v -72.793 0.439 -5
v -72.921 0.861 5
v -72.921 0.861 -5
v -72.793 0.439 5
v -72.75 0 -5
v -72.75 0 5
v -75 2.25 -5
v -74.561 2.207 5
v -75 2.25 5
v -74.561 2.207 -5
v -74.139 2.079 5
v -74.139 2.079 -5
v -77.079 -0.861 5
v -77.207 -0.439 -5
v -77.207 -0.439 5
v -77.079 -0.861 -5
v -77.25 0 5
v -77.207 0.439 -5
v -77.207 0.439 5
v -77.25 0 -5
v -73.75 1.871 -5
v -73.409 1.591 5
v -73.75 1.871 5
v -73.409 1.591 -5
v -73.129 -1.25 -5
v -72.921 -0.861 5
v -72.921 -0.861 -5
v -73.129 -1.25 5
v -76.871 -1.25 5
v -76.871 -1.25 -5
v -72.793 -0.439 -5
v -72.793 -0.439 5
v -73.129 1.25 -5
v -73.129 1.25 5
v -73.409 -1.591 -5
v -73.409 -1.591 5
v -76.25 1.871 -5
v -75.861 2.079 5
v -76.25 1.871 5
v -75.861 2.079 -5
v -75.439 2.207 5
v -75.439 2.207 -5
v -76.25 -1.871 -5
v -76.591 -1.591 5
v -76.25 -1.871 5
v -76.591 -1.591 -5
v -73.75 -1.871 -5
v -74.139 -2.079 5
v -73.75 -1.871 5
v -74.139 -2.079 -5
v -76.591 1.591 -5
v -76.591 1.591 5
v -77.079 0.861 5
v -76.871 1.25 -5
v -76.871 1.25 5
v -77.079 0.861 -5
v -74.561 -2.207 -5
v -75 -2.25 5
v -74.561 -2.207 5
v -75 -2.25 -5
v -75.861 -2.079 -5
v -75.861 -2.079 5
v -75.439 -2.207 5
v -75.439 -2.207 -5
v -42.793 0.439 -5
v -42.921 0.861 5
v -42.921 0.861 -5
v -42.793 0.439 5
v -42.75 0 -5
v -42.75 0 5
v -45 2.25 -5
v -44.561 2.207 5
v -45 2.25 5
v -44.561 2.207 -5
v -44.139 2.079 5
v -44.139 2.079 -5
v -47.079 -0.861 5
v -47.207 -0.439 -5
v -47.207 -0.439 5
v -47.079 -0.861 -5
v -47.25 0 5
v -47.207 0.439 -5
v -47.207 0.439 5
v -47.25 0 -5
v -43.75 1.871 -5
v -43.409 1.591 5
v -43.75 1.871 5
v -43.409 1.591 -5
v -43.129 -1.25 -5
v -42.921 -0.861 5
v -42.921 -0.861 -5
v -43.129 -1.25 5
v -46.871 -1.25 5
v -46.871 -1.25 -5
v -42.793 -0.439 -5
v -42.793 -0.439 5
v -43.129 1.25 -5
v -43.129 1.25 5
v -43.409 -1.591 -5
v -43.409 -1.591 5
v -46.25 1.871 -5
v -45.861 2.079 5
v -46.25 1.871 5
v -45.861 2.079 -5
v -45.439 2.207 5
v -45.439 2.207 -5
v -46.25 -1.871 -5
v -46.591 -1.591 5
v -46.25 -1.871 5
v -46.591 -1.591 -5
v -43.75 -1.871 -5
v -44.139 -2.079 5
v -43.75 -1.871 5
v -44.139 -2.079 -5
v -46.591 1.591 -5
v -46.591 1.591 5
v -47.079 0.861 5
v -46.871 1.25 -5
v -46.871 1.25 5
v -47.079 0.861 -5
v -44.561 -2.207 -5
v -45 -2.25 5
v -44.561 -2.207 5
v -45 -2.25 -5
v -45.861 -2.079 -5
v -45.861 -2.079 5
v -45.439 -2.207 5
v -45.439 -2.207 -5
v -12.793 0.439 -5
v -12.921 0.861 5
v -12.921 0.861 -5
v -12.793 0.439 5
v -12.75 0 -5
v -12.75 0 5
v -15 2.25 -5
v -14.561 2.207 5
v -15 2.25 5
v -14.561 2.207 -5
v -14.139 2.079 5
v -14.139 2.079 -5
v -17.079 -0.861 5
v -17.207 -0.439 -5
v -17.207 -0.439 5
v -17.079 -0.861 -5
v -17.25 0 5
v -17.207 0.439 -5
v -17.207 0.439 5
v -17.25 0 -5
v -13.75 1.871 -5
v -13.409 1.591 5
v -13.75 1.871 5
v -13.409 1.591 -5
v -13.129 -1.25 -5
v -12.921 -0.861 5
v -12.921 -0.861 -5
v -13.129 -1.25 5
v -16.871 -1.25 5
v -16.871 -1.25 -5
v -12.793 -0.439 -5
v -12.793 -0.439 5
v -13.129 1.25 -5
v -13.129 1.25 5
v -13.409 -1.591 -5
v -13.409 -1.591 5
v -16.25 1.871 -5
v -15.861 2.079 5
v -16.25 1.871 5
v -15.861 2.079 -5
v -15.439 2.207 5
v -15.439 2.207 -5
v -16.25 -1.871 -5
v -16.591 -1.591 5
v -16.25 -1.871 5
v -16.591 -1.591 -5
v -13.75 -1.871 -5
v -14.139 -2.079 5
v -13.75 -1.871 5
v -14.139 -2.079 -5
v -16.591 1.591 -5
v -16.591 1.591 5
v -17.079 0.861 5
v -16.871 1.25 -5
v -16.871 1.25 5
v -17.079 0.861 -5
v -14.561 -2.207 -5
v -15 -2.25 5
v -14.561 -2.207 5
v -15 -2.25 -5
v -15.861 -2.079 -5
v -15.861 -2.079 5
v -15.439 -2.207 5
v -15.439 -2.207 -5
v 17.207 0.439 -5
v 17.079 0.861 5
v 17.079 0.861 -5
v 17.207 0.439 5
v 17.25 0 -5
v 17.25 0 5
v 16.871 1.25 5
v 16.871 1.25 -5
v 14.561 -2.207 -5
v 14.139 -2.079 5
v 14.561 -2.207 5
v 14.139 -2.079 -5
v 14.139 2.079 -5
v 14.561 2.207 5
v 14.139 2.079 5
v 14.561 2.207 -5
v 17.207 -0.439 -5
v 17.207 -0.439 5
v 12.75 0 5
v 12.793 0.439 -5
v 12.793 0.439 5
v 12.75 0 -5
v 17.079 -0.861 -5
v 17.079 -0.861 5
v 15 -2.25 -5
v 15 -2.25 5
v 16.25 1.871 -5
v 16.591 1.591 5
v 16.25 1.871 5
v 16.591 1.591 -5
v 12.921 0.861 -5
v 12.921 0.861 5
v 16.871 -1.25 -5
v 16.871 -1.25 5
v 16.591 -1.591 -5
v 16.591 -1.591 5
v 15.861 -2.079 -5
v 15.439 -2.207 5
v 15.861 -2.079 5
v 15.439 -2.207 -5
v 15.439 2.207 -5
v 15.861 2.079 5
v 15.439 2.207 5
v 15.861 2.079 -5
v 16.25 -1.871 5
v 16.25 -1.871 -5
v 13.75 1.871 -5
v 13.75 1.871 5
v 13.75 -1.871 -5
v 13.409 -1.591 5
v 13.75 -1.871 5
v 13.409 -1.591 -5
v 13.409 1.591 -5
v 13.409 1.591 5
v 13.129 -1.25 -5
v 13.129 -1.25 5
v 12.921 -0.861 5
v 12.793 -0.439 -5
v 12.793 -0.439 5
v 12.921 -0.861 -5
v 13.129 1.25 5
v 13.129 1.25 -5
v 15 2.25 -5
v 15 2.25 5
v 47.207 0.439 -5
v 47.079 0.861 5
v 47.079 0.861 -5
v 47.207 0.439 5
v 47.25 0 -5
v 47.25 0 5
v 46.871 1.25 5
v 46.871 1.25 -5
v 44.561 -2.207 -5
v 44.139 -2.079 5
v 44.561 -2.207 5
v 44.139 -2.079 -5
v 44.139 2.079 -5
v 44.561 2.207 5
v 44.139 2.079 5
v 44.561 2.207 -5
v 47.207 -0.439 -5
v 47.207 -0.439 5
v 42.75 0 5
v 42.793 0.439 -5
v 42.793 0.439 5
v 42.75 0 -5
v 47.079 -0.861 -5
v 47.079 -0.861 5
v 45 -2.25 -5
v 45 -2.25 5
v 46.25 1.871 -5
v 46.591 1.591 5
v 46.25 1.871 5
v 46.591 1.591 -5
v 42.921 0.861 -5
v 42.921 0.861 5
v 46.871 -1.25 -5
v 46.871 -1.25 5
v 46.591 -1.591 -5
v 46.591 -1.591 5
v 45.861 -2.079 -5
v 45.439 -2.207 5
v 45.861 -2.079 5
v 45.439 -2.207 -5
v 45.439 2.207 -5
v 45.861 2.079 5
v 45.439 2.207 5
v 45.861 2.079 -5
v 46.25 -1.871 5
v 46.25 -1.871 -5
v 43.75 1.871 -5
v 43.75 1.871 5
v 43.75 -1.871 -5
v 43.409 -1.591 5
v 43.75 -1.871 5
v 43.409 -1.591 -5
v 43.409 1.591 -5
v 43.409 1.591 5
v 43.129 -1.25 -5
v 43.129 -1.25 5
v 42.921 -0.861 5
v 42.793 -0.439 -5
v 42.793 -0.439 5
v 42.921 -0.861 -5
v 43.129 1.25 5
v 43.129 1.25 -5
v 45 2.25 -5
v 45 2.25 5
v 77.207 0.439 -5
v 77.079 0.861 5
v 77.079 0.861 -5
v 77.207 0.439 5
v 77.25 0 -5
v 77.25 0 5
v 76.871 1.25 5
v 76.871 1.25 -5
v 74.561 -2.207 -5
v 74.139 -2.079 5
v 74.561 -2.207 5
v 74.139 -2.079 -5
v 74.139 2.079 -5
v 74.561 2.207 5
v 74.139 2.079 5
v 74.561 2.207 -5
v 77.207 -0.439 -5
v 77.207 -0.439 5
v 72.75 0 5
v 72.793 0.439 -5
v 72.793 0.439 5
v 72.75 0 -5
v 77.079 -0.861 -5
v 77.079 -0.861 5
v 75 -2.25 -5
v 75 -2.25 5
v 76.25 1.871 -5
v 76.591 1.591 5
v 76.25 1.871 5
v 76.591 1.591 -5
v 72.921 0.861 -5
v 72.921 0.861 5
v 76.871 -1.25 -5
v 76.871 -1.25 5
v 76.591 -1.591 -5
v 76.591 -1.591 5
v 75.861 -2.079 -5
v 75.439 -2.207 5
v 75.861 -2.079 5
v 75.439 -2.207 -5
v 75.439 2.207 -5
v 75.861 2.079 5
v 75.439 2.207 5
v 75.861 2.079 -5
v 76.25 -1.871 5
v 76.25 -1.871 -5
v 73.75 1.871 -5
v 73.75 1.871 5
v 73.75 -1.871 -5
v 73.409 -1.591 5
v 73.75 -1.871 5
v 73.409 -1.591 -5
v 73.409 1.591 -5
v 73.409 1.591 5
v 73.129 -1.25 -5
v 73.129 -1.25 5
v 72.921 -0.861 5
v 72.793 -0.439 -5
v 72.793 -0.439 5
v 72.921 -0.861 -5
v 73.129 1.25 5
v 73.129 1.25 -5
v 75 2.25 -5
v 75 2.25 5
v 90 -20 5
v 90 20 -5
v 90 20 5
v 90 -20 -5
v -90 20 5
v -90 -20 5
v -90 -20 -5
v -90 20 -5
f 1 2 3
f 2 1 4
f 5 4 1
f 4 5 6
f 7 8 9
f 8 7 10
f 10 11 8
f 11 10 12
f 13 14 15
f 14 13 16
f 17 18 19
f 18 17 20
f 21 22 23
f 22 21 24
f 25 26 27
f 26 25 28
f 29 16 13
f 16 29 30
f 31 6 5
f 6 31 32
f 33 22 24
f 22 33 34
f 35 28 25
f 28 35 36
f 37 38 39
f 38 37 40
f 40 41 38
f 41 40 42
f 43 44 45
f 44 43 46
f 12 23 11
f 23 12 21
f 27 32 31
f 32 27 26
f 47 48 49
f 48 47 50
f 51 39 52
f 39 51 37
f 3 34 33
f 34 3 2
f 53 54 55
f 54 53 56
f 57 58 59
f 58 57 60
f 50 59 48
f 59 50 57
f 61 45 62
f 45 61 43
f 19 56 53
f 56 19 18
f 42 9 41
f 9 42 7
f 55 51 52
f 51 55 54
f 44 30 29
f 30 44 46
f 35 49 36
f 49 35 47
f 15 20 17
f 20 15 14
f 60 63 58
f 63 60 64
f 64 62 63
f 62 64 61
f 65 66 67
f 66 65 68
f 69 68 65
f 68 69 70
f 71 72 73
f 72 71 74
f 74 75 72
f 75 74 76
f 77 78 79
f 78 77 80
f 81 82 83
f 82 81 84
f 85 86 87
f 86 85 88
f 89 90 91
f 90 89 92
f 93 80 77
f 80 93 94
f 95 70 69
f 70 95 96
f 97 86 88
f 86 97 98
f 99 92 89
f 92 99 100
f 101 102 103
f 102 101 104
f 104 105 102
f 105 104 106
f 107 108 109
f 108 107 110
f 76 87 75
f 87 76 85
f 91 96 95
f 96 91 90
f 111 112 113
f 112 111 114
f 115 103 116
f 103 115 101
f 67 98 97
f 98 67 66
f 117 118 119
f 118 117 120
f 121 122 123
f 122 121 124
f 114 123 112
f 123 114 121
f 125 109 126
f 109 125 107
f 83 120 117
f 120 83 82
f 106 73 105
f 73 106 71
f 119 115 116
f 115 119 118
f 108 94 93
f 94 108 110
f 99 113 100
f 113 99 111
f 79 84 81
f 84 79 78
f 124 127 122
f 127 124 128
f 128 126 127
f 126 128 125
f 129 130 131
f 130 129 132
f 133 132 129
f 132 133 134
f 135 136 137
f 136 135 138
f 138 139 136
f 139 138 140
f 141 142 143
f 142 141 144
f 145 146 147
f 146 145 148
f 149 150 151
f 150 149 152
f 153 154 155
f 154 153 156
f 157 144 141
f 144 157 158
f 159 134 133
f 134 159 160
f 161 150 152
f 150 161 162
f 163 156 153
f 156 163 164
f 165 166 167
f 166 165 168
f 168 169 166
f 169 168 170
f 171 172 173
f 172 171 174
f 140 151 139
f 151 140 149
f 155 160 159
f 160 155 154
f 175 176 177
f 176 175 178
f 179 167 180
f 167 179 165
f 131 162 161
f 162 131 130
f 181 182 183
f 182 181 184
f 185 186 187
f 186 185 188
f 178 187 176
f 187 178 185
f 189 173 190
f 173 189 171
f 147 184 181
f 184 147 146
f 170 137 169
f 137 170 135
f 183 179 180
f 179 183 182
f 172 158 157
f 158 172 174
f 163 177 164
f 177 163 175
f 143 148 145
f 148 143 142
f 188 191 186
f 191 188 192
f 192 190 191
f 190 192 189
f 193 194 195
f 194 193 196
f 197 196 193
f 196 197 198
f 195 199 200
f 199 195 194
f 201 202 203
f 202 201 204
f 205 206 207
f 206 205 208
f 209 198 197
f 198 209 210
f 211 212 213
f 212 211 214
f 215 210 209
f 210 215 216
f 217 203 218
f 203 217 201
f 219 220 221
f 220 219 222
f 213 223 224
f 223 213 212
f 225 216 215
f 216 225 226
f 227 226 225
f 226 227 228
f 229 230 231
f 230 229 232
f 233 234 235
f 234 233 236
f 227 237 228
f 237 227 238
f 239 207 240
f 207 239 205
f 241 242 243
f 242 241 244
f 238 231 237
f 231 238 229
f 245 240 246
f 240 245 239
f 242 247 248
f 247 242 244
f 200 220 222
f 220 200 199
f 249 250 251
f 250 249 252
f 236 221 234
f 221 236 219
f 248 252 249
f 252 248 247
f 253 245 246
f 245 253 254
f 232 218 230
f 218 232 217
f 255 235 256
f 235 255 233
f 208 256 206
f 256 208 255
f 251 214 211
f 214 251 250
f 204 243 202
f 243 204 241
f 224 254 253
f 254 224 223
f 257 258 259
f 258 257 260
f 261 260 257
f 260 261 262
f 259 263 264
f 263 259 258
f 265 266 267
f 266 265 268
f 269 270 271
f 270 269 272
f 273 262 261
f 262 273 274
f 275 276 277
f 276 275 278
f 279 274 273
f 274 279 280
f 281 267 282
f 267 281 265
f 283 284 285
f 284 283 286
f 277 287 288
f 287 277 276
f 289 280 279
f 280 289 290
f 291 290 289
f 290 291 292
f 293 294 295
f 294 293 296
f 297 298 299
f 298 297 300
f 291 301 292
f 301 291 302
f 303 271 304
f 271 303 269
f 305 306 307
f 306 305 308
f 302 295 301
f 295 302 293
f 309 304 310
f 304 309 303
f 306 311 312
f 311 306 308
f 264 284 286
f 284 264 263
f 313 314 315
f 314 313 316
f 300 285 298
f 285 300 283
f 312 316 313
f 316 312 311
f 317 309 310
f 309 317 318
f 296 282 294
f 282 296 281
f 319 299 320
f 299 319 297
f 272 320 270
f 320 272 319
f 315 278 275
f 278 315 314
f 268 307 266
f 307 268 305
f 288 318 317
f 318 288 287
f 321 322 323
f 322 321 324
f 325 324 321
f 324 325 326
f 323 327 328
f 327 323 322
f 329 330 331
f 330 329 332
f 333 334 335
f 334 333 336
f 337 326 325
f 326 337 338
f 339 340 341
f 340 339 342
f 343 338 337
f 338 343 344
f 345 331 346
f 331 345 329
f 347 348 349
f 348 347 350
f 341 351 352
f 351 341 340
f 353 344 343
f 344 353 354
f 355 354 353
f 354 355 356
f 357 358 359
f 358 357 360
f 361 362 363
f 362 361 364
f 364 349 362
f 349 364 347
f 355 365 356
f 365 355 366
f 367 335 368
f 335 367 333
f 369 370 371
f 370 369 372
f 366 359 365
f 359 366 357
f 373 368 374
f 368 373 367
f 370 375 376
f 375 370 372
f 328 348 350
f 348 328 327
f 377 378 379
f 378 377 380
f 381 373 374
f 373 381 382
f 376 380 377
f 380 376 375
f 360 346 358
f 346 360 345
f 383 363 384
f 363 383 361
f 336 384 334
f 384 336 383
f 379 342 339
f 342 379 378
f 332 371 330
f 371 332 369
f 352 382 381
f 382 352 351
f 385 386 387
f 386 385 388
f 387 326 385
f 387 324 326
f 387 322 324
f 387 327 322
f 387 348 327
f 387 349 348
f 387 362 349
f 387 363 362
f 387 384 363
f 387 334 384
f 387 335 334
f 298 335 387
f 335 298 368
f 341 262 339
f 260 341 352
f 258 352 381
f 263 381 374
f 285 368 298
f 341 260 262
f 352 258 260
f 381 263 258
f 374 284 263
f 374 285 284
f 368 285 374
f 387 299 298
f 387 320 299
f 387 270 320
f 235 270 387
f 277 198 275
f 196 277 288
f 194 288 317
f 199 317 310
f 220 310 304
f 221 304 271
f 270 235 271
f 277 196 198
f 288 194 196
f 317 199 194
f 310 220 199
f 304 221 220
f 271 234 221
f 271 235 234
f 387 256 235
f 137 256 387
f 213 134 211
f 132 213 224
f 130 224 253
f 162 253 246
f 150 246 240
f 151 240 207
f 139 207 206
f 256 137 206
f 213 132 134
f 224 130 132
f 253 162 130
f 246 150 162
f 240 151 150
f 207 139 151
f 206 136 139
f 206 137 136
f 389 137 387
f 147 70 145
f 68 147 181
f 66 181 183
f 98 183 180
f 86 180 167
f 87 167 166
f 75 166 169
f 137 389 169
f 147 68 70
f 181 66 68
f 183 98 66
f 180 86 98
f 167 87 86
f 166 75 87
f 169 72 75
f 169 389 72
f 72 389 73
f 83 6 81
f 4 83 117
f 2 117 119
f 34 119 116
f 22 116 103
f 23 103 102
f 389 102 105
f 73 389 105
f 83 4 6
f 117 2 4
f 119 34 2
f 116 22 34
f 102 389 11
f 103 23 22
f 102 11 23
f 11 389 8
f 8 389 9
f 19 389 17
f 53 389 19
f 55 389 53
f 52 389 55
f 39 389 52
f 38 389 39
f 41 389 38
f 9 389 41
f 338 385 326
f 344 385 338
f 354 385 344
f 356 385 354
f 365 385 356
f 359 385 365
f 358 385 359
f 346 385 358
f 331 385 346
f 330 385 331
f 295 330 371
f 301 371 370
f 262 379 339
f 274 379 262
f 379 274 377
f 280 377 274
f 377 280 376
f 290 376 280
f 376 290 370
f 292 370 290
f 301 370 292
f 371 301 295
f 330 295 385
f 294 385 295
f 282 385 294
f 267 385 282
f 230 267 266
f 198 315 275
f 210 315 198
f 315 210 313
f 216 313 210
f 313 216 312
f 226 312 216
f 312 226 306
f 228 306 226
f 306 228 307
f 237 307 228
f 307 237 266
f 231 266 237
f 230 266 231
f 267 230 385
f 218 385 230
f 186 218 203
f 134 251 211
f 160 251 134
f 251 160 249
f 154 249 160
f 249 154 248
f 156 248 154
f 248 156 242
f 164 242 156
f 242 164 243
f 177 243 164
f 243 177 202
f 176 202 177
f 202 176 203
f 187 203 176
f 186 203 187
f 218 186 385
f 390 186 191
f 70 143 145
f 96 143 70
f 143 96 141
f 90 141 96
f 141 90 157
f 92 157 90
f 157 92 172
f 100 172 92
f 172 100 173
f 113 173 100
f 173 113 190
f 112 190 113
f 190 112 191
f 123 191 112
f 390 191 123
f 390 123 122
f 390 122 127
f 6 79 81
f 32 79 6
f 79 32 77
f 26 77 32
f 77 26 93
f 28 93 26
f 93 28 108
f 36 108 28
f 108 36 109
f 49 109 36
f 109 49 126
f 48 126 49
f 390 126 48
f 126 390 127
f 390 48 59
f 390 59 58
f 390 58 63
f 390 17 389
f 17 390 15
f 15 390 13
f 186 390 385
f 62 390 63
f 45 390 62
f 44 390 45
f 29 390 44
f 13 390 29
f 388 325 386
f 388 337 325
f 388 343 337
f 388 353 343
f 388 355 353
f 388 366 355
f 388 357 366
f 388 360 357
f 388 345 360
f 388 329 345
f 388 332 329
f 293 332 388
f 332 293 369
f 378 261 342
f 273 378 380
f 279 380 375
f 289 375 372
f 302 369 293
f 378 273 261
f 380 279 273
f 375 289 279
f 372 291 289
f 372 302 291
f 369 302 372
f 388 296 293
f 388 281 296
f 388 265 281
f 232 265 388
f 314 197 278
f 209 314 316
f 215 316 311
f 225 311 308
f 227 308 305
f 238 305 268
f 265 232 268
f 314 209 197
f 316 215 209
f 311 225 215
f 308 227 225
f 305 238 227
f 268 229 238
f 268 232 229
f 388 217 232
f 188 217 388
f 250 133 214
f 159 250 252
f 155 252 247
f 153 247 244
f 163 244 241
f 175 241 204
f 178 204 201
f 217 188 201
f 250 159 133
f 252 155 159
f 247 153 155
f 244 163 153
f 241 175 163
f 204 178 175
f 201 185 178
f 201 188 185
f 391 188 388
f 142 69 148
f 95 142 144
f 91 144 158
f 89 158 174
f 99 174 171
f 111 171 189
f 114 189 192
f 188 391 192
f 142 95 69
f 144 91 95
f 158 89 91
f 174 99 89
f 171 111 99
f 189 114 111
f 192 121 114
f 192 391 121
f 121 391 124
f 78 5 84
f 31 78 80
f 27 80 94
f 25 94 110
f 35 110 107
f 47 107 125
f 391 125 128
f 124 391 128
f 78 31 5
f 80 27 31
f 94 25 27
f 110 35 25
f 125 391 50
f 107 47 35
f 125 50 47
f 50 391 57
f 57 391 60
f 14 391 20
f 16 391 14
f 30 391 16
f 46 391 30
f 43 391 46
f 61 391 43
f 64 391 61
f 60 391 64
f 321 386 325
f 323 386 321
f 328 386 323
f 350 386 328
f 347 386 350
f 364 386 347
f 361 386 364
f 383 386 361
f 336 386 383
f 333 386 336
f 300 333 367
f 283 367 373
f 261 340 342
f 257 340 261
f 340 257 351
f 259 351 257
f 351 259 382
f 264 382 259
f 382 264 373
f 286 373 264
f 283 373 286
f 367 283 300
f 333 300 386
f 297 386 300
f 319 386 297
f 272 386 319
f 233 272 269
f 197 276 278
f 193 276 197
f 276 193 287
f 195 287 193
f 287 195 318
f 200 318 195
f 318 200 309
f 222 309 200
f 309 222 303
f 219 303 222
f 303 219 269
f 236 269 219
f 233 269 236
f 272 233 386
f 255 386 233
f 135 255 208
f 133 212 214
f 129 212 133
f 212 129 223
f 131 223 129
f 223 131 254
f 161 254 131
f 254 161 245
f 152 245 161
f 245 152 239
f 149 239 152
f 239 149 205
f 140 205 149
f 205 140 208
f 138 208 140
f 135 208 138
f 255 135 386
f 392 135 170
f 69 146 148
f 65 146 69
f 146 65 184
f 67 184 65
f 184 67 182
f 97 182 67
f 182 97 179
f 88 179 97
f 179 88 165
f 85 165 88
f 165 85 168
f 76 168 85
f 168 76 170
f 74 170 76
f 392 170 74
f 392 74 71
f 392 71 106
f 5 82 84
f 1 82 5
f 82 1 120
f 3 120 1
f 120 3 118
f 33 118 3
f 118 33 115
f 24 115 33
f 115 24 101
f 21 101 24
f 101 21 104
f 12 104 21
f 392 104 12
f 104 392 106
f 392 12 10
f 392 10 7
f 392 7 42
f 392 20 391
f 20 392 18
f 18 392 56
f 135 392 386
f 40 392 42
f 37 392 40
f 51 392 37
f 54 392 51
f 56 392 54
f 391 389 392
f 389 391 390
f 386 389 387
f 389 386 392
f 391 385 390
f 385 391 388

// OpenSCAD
$fn = 32;

// ----------------------------------------------------------------------
// Hole bar, 6 x Ø4.5
// row layout, 15 mm edge offset
// ----------------------------------------------------------------------

// --- parameters (mm) ---
bar_w = 40;    // bar width (Y)
bar_t = 10;    // bar thickness (Z)
holes = 6;     // holes per row
hole_d = 4.5;  // hole diameter
edge = 15;     // offset from the bar end to the first hole
pitch = 30;    // pitch between neighbouring holes

// --- derived feature positions (mm) ---
span = (holes - 1) * pitch;   // = 150   distance between the end holes
bar_l = span + 2 * edge;      // = 180   overall bar length
start_x = -bar_l / 2 + edge;  // = -75   X of the first hole
feature_centers = [
  [start_x + 0 * pitch, 0],
  [start_x + 1 * pitch, 0],
  [start_x + 2 * pitch, 0],
  [start_x + 3 * pitch, 0],
  [start_x + 4 * pitch, 0],
  [start_x + 5 * pitch, 0]
];   // hole centres of the first row

// bar with one row of holes, drilled from feature_centers
difference() {
  translate([-bar_l / 2, -bar_w / 2, -bar_t / 2]) cube([bar_l, bar_w, bar_t]);
  for (centre = feature_centers)
    translate([centre[0], centre[1], 0])
      cylinder(d = hole_d, h = bar_t + 2, center = true);
}
